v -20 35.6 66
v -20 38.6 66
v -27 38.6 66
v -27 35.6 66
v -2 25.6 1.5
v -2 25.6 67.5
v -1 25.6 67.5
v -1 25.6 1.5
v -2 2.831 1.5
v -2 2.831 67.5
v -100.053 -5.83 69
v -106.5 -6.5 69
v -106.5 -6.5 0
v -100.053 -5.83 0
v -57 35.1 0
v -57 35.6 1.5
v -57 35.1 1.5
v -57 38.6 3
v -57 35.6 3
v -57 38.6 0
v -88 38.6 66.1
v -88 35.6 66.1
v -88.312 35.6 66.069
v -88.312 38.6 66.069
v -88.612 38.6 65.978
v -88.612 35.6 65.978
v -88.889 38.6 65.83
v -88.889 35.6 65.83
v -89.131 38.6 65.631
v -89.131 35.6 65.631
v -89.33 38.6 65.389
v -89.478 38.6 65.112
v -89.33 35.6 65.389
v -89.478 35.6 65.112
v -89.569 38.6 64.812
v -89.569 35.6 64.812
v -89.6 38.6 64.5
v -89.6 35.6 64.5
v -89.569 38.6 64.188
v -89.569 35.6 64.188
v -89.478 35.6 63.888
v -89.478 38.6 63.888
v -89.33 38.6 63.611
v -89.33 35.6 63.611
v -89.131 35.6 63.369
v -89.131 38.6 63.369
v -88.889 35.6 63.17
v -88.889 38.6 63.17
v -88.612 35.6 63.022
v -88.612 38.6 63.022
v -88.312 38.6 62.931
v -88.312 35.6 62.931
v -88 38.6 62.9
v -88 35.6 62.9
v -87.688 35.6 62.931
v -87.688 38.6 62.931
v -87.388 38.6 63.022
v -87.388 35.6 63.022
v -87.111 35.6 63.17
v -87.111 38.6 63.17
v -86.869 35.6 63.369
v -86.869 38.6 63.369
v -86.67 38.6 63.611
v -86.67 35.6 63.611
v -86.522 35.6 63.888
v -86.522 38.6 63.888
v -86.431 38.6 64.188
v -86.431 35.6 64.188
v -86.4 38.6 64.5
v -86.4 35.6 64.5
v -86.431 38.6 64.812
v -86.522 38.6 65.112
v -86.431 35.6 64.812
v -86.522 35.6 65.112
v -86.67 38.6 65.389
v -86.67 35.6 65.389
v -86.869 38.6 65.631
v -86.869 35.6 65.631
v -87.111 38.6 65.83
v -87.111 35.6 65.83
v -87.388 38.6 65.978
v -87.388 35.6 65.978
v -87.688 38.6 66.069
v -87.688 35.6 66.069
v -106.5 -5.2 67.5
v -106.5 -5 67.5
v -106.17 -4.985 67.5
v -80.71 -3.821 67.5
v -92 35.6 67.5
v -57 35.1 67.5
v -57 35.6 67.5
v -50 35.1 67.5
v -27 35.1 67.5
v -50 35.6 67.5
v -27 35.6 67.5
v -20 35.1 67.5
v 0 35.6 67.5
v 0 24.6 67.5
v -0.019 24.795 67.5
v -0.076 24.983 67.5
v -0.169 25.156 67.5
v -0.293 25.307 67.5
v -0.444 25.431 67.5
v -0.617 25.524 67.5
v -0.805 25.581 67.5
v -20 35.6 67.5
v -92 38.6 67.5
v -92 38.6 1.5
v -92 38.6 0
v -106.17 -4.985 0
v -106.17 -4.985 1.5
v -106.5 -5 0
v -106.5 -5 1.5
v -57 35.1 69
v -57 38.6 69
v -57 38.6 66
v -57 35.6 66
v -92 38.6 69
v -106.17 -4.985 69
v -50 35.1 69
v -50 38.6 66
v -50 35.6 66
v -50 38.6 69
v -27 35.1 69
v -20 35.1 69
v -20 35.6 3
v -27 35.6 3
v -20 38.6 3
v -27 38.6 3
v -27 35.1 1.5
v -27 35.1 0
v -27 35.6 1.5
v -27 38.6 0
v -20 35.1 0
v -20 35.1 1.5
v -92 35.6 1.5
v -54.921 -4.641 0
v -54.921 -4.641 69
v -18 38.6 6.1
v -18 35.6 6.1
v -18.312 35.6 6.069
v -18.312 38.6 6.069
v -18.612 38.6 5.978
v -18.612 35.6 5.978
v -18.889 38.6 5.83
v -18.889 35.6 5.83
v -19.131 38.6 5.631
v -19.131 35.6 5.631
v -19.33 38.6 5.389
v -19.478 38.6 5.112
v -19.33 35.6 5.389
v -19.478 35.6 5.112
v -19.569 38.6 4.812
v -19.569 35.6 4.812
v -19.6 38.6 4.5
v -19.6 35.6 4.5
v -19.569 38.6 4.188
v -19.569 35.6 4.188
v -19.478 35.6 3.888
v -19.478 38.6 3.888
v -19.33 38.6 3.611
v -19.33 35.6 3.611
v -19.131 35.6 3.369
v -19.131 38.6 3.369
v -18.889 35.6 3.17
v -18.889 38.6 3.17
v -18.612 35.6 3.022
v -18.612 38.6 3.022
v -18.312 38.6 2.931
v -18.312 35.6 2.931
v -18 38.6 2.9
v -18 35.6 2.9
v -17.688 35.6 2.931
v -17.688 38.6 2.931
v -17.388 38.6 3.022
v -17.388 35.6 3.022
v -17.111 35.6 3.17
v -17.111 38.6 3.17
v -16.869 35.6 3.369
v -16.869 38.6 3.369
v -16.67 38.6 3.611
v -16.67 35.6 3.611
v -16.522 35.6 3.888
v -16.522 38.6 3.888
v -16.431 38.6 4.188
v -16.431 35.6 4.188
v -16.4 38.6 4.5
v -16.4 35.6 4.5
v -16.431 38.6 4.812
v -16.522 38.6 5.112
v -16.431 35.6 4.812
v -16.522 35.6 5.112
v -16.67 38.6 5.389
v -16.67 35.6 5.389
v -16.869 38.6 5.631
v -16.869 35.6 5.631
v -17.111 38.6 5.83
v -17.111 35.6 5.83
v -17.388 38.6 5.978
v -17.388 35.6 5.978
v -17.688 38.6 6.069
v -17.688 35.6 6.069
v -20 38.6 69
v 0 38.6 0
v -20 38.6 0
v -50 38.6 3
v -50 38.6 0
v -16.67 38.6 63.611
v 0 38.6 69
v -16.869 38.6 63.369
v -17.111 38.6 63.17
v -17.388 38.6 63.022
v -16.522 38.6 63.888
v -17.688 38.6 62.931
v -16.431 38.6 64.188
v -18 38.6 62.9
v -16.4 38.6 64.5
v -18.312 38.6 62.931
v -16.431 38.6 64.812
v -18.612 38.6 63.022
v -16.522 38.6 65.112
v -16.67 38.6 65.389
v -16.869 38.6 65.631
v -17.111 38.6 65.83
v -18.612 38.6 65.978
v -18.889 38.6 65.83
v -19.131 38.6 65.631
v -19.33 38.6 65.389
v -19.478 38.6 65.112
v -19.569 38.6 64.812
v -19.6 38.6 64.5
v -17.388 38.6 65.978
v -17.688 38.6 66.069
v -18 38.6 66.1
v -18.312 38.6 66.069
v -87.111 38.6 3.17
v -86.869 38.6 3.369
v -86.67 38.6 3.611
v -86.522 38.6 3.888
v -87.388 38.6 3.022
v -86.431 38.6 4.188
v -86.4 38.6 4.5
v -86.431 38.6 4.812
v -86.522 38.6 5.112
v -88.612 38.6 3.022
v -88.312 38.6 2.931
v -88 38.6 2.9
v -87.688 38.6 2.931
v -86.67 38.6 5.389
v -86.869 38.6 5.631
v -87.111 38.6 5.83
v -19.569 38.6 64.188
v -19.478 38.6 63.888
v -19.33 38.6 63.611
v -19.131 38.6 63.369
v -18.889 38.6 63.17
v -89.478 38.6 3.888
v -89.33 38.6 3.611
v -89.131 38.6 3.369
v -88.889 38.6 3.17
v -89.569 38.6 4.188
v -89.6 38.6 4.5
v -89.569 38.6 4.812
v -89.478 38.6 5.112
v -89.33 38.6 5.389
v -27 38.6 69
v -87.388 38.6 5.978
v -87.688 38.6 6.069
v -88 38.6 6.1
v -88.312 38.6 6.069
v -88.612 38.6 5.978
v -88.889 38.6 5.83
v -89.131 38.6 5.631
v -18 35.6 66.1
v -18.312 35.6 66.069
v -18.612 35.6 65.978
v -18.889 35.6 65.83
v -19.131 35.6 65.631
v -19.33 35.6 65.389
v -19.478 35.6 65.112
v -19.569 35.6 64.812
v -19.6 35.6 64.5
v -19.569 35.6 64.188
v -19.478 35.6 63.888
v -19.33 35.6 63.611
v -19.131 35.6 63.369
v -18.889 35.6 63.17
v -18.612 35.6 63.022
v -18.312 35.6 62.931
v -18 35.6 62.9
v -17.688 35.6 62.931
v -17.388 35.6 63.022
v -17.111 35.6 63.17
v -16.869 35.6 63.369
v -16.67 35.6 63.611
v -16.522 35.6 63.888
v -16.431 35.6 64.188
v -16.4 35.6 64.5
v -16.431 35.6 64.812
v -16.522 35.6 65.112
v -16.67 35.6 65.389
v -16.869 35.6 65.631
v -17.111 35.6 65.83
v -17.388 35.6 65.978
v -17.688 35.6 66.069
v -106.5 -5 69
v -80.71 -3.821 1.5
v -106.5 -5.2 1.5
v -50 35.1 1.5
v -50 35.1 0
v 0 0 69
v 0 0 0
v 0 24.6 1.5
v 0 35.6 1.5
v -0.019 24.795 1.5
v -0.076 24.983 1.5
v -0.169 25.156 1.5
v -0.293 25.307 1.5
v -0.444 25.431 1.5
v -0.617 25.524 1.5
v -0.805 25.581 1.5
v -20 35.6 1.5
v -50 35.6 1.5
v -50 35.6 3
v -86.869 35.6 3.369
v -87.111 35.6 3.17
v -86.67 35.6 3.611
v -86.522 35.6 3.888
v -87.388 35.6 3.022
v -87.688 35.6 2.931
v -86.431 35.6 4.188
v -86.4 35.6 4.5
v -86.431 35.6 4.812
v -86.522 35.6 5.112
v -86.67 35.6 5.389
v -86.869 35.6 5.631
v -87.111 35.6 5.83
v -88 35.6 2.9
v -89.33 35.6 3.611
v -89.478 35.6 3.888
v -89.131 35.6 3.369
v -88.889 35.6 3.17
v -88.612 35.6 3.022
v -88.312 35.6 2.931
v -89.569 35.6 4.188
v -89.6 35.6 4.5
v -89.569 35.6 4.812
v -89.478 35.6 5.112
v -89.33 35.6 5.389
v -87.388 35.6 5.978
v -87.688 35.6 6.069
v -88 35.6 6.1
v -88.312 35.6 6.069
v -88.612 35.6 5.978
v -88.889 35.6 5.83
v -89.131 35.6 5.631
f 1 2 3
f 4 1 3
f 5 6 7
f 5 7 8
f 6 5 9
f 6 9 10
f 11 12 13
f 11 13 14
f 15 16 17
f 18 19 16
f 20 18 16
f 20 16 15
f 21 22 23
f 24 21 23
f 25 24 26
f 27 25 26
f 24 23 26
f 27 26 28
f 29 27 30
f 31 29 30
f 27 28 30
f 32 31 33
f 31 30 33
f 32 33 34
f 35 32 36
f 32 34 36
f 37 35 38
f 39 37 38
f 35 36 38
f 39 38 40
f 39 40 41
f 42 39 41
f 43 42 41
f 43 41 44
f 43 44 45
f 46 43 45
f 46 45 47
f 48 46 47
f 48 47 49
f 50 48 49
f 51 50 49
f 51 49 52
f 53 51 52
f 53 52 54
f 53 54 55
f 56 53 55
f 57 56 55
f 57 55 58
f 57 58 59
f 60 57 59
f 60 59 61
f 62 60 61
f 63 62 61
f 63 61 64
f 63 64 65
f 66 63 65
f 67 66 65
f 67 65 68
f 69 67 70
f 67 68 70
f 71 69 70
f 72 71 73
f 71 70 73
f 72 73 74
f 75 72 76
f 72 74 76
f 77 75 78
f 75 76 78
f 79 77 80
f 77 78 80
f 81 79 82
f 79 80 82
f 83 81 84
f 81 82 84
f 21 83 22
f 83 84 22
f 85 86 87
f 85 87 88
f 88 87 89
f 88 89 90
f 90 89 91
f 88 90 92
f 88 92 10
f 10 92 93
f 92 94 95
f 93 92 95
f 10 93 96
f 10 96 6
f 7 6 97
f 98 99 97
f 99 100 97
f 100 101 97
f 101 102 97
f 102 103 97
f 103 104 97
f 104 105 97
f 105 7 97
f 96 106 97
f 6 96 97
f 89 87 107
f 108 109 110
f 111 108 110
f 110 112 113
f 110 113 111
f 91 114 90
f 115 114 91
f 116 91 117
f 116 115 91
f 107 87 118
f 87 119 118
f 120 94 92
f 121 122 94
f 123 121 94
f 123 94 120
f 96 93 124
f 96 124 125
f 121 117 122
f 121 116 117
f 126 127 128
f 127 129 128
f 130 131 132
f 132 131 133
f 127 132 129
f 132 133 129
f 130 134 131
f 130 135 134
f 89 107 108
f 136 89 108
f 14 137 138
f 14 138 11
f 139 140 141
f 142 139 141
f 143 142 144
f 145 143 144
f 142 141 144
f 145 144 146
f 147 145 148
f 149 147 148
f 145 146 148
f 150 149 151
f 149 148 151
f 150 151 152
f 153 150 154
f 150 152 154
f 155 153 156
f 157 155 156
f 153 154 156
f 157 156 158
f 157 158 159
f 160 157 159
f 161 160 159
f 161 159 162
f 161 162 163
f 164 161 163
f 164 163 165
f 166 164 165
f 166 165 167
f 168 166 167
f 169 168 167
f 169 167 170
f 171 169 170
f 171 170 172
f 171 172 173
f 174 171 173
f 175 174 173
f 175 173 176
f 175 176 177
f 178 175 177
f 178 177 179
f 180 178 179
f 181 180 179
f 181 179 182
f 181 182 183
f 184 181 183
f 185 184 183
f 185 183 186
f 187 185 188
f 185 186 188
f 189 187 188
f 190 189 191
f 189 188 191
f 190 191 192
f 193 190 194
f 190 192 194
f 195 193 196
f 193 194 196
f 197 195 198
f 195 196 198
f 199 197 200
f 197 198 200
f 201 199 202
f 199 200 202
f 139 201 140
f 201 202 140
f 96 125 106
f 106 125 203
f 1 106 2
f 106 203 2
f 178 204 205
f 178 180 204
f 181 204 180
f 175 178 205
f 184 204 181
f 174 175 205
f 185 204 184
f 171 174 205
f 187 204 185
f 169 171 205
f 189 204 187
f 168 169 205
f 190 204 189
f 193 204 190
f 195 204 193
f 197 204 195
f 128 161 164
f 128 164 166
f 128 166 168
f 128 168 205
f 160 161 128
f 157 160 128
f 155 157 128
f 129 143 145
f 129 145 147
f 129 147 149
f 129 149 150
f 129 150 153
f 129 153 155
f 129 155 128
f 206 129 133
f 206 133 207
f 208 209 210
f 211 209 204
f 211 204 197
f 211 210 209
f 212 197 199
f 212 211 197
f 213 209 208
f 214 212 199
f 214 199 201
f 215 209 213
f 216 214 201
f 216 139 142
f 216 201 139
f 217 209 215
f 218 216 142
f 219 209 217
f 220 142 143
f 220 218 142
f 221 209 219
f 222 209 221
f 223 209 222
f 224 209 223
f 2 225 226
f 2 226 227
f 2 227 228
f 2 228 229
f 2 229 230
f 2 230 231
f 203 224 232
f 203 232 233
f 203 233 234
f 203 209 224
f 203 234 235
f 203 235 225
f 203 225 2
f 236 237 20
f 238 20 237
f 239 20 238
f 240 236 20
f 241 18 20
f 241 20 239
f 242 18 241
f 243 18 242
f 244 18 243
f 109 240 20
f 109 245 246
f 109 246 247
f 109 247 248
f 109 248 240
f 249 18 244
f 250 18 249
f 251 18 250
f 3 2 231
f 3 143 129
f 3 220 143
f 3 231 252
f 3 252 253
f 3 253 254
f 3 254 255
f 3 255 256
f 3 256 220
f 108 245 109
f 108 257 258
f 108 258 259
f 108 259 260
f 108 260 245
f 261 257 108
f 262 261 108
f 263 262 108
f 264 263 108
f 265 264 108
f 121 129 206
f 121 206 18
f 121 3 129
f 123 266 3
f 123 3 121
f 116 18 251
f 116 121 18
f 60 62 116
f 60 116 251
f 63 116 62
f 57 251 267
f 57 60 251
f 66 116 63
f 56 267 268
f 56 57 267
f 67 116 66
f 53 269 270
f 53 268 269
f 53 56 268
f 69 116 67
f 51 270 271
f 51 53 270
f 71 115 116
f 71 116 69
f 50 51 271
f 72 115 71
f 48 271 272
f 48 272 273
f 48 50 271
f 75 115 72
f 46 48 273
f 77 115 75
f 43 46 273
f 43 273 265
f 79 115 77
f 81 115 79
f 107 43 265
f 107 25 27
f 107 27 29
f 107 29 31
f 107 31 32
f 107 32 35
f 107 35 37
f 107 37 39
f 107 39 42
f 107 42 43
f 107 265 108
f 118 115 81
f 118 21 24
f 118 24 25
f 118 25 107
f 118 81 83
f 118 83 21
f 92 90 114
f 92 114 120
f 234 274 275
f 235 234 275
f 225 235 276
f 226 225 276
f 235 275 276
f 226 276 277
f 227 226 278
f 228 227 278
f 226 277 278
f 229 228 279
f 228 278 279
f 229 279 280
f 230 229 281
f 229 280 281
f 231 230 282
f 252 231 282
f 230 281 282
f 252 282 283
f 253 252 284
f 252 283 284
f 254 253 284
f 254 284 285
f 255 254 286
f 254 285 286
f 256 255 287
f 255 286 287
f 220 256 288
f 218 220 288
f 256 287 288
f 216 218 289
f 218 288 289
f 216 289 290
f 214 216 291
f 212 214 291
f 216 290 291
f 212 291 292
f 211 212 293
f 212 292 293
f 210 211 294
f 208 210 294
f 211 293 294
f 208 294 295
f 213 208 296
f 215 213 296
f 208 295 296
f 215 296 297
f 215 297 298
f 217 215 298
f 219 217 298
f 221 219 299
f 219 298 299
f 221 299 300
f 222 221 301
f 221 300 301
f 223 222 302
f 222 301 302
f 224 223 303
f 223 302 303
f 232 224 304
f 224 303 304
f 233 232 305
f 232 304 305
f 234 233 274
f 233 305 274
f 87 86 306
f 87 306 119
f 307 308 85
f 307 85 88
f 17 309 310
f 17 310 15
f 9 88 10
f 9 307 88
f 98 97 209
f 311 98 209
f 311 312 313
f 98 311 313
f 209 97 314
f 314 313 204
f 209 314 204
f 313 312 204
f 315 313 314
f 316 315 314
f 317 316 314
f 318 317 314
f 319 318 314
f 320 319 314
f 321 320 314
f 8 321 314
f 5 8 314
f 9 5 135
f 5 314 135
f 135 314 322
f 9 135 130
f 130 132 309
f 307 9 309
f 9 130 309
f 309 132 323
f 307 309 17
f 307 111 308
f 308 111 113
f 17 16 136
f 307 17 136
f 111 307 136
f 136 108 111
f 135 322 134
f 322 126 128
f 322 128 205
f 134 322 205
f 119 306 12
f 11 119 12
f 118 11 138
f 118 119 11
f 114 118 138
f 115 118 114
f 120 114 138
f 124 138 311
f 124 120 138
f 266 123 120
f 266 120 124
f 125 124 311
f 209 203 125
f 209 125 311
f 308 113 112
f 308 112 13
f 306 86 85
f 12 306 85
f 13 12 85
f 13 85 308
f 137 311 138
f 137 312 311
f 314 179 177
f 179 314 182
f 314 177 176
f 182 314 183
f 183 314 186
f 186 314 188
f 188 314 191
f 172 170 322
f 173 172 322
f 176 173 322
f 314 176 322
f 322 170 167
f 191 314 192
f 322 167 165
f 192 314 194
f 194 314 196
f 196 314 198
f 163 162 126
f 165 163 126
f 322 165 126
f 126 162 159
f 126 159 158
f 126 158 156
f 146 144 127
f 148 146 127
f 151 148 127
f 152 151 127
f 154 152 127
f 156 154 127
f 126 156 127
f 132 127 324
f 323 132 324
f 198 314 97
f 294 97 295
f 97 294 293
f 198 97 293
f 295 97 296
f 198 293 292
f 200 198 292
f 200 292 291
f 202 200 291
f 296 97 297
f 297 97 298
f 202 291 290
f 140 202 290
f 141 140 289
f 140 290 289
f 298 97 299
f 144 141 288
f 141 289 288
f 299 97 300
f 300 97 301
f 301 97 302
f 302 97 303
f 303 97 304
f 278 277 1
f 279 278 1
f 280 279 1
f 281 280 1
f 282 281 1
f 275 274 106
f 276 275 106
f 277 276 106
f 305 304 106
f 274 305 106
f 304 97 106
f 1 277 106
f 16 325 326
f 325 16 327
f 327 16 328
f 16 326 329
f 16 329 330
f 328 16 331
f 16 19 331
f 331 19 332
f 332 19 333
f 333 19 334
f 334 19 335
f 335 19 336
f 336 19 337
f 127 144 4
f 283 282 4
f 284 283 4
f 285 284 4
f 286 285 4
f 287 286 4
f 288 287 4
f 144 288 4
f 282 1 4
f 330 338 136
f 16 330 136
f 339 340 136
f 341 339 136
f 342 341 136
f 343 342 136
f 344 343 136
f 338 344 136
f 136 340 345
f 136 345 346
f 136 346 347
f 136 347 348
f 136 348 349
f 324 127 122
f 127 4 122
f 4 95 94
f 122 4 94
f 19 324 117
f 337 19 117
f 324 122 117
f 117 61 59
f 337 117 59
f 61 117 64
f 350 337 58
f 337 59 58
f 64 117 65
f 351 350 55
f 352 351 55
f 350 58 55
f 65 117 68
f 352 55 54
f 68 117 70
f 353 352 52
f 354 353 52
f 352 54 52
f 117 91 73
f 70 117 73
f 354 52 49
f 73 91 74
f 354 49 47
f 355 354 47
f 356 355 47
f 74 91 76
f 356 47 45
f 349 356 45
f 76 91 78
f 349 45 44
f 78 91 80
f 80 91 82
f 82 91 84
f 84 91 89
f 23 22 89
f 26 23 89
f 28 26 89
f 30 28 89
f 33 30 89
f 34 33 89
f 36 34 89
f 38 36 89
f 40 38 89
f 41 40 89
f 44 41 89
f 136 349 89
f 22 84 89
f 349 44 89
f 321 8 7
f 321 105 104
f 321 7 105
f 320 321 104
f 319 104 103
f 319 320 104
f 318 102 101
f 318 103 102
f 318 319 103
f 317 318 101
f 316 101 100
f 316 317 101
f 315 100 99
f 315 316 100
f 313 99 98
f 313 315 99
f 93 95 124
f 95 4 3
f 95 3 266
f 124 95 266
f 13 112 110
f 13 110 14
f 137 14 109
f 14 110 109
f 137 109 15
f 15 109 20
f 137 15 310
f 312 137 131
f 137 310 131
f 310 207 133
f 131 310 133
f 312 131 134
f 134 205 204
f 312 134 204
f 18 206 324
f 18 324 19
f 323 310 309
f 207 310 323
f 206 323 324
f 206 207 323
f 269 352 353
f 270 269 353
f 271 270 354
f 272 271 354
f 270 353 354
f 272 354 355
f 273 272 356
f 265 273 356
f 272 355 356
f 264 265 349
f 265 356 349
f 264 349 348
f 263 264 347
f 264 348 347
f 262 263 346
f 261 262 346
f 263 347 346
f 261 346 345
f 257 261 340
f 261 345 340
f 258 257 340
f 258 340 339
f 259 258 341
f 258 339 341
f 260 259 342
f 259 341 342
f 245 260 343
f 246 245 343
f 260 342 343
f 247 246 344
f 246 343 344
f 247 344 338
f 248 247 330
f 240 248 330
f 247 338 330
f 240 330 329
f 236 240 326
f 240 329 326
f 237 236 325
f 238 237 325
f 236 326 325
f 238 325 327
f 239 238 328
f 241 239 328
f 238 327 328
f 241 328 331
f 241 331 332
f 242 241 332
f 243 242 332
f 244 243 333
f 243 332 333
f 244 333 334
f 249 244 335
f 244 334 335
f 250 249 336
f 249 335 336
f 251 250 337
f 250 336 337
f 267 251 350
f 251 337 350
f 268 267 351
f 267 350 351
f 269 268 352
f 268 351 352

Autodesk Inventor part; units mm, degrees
sketch "草图1" plane through (0, 0, 0) normal (0, 0, 1) x (1, 0, 0)
  line L0 (0, 0) -> (0, 3)
  line L1 (0, 0) -> (0, -6) construction
  line L2 (0, -6) -> (-106.5, -6) construction
  line L3 (-106.5, -6) -> (0, 3)
  line L4 (0, 0) -> (-54.9206, -4.6412)
  line L5 (-54.9206, -4.6412) -> (-106.5, -6)
  dimension "d0" = 3
  dimension "d1" = 6
  dimension "d2" = 106.5
extrude "拉伸1" add sketch "草图1" along normal blind 69
ref_plane "工作平面1" through (0, 38.6, 0) normal (0, 1, 0) x (-1, 0, 0)
sketch "草图2" plane through (0, 38.6, 0) normal (0, 1, 0) x (-1, 0, 0)
  line L0 (0, 0) -> (106.5, 0) construction
  line L1 (106.5, 0) -> (106.5, 69) construction
  line L2 (0, 69) -> (106.5, 69) construction
  line L3 (0, 0) -> (0, 69) construction
  line L4 (0, 0) -> (92, 0)
  line L5 (92, 0) -> (92, 1.5)
  line L6 (92, 1.5) -> (2, 1.5)
  line L7 (2, 1.5) -> (2, 67.5)
  line L8 (2, 67.5) -> (92, 67.5)
  line L9 (92, 67.5) -> (92, 69)
  line L10 (0, 0) -> (0, 69) projected
  line L11 (0, 69) -> (92, 69)
  line L12 (0, 69) -> (106.5, 69) projected
  line L13 (0, 0) -> (0, 69)
  dimension "d6" = 1.5
  dimension "d7" = 1.5
  dimension "d8" = 66
  dimension "d9" = 2
  dimension "d10" = 90
extrude "拉伸2" add sketch "草图2" against normal up to surface from surface at 0 surface through (0, 3, 0) normal (-0.0842069, 0.9964483, 0)
sketch "草图3" plane through (0, 38.6, 0) normal (0, 1, 0) x (-1, 0, 0)
  line L0 (2, 1.5) -> (92, 1.5) construction
  line L1 (2, 67.5) -> (2, 1.5) construction
  line L2 (92, 67.5) -> (2, 67.5) construction
  line L3 (92, 1.5) -> (2, 1.5)
  line L4 (2, 1.5) -> (2, 67.5)
  line L5 (92, 67.5) -> (2, 67.5)
  line L6 (92, 67.5) -> (92, 1.5)
  point P0 (0, 0)
extrude "拉伸3" add sketch "草图3" against normal blind 3
sketch "草图4" plane through (-2, 2.831, 1.5) normal (-1, 0, 0) x (0, 0, 1)
  line L0 (66, 32.769) -> (0, 32.769) construction
  line L1 (0, 0) -> (0, 32.769) construction
  line L2 (66, 0) -> (0, 0) construction
  line L3 (66, 0) -> (66, 32.769) construction
  line L4 (66, -7.6056) -> (66, 32.769) projected
  line L5 (0, 32.769) -> (66, 32.769)
  line L6 (66, 32.769) -> (66, 22.769)
  line L7 (66, 22.769) -> (0, 22.769)
  line L8 (0, 22.769) -> (0, 32.769)
  point P0 (-1.5, -2.831)
  dimension "d15" = 10
extrude "拉伸4" cut sketch "草图4" against normal through all
sketch "草图5" plane through (0, 0, 69) normal (0, 0, 1) x (1, 0, 0)
  line L0 (-92, -4.7746) -> (-92, 38.6) construction
  line L1 (-92, -4.7746) -> (-106.5, -6) construction
  line L2 (-92, 38.6) -> (-92, -4.7746)
  line L3 (-106.5, -6) -> (-54.9206, -4.6412) projected
  line L4 (-92, -4.7746) -> (-92, 35.6) projected
  line L5 (-106.5, -6) -> (-92, -4.7746)
  line L6 (-92, -4.7746) -> (-92, 38.6) projected
  line L7 (-106.5, -6) -> (-92, 38.6)
  point P0 (0, 0)
extrude "拉伸5" add sketch "草图5" against normal blind 1.5
ref_plane "工作平面2" through (0, 0, 34.5) normal (0, 0, -1) x (-1, 0, 0)
mirror "镜像1" about plane through (0, 0, 34.5) normal (0, 0, -1) of "拉伸5"
sketch "草图7" plane through (0, 38.6, 69) normal (0, 1, 0) x (1, 0, 0)
  line L0 (-92, 69) -> (0, 69) projected
  line L1 (0, 69) -> (0, 0) construction
  line L2 (0, 34.5) -> (-92.7255, 34.5) construction
  line L3 (-92, 1.5) -> (-92, 67.5) projected
  point P0 (-18, 64.5)
  point P1 (-52, 64.5)
  point P2 (-88, 64.5)
  point P3 (-18, 4.5)
  point P4 (-52, 4.5)
  point P5 (-88, 4.5)
  point P6 (-92, 66.5)
  dimension "d22" = 4.5
  dimension "d23" = 4.5
  dimension "d24" = 4.5
  dimension "d25" = 34
  dimension "d26" = 36
  dimension "d27" = 60
  dimension "d35" = 4
hole "孔1" at (-88, 38.6, 64.5) at (-88, 38.6, 4.5) at (-18, 38.6, 4.5) at (-18, 38.6, 64.5) direction (0, -1, 0) diameter 3.2 depth 3
fillet "圆角1" radius 1 1 edges at (0, 25.6, 34.5)
sketch "草图9" plane through (0, 0, 69) normal (0, 0, 1) x (1, 0, 0)
  point P0 (0, 0)
sketch "草图10" plane through (0, 0, 69) normal (0, 0, 1) x (1, 0, 0)
  line L0 (-92, 38.6) -> (-106.5, -6) construction
  line L1 (-92, 35.6) -> (-92, 38.6) construction
  line L2 (-92, -4.7746) -> (-92, 35.6) construction
  line L3 (-92, -4.7746) -> (-106.5, -6) construction
  line L4 (-106.5, -6) -> (-54.9206, -4.6412) projected
  line L5 (-106.5, -6) -> (-106.5, -5)
  line L6 (-127.8168, 0) -> (21.4009, 0) projected
  line L7 (-106.5, -5) -> (-80.7103, -3.8206)
  line L8 (-2, 2.831) -> (-106.5, -6) projected
  line L9 (-106.5, -6) -> (-92, 38.6) projected
  line L10 (-106.5, -6) -> (-80.7103, -3.8206)
  line L11 (-106.5, -6) -> (-106.5, -6.5)
  line L12 (-106.5, -6.5) -> (-80.7103, -3.8206)
  line L13 (-106.5, -5.2) -> (-80.7103, -3.8206)
  point P0 (0, 0)
  dimension "d37" = 1
  dimension "d38" = 25.7897
  dimension "d42" = 0.5
  dimension "d55" = 0.2
extrude "拉伸7" add sketch "草图10" against normal up to surface (69 mm away) from surface at 0 contours L8 L12 L4 | L9 L13 L8 | L5 L13 L9 | L4 L12 L11 | L5 L7 L9 L13 | L13 L9 L7
sketch "草图11" plane through (-54.9206, -4.6412, 0) normal (0.0263351, -0.9996532, 0) x (0.9996532, 0.0263351, 0)
  point P0 (55.0238, 0)
ref_plane "工作平面3" through (0, -6, 0) normal (0, 1, 0) x (-1, 0, 0)
sketch "草图12" plane through (0, 38.6, 69) normal (0, 1, 0) x (1, 0, 0)
  line L0 (0, 0) -> (-92, 0) projected
  line L1 (-53.5, 0) -> (-53.5, 3)
  line L2 (-92, 1.5) -> (-92, 67.5) projected
  line L3 (-54.9206, 0) -> (0, 0) projected
  line L4 (-57, 3) -> (-50, 3)
  line L5 (-50, 3) -> (-50, 0)
  line L6 (-50, 0) -> (-57, 0)
  line L7 (-57, 0) -> (-57, 3)
  line L8 (-92, 1.5) -> (0, 1.5) projected
  line L9 (-57, 3) -> (-50, 0) construction
  line L10 (-50, 3) -> (-57, 0) construction
  line L11 (-20, 3) -> (-27, 3)
  line L12 (-27, 3) -> (-27, 0)
  line L13 (-27, 0) -> (-20, 0)
  line L14 (-20, 0) -> (-20, 3)
  line L15 (-20, 3) -> (-27, 0) construction
  line L16 (-27, 3) -> (-20, 0) construction
  point P0 (0, 69)
  point P1 (-53.5, 1.5)
  point P2 (-23.5, 1.5)
  dimension "d43" = 38.5
  dimension "d44" = 3
  dimension "d45" = 7
  dimension "d46" = 68.5
  dimension "d47" = 3
  dimension "d48" = 7
extrude "拉伸8" cut sketch "草图12" against normal blind 3.5 contours L0 L12 L8 L14 | L8 L12 L11 L14 | L0 L1 L8 L5 | L0 L7 L8 L1 | L8 L1 L4 L5 | L8 L7 L4 L1
ref_plane "工作平面4" through (0, 0, 34.5) normal (0, 0, 1) x (1, 0, 0)
mirror "镜像2" about plane through (0, 0, 34.5) normal (0, 0, 1) of "拉伸8"
extrude "拉伸9" cut sketch "草图10" along normal up to surface (66 mm away) from surface at -67.5 contours L5 L7 L9 L13 | L13 L9 L7
properties part number "仓库"
